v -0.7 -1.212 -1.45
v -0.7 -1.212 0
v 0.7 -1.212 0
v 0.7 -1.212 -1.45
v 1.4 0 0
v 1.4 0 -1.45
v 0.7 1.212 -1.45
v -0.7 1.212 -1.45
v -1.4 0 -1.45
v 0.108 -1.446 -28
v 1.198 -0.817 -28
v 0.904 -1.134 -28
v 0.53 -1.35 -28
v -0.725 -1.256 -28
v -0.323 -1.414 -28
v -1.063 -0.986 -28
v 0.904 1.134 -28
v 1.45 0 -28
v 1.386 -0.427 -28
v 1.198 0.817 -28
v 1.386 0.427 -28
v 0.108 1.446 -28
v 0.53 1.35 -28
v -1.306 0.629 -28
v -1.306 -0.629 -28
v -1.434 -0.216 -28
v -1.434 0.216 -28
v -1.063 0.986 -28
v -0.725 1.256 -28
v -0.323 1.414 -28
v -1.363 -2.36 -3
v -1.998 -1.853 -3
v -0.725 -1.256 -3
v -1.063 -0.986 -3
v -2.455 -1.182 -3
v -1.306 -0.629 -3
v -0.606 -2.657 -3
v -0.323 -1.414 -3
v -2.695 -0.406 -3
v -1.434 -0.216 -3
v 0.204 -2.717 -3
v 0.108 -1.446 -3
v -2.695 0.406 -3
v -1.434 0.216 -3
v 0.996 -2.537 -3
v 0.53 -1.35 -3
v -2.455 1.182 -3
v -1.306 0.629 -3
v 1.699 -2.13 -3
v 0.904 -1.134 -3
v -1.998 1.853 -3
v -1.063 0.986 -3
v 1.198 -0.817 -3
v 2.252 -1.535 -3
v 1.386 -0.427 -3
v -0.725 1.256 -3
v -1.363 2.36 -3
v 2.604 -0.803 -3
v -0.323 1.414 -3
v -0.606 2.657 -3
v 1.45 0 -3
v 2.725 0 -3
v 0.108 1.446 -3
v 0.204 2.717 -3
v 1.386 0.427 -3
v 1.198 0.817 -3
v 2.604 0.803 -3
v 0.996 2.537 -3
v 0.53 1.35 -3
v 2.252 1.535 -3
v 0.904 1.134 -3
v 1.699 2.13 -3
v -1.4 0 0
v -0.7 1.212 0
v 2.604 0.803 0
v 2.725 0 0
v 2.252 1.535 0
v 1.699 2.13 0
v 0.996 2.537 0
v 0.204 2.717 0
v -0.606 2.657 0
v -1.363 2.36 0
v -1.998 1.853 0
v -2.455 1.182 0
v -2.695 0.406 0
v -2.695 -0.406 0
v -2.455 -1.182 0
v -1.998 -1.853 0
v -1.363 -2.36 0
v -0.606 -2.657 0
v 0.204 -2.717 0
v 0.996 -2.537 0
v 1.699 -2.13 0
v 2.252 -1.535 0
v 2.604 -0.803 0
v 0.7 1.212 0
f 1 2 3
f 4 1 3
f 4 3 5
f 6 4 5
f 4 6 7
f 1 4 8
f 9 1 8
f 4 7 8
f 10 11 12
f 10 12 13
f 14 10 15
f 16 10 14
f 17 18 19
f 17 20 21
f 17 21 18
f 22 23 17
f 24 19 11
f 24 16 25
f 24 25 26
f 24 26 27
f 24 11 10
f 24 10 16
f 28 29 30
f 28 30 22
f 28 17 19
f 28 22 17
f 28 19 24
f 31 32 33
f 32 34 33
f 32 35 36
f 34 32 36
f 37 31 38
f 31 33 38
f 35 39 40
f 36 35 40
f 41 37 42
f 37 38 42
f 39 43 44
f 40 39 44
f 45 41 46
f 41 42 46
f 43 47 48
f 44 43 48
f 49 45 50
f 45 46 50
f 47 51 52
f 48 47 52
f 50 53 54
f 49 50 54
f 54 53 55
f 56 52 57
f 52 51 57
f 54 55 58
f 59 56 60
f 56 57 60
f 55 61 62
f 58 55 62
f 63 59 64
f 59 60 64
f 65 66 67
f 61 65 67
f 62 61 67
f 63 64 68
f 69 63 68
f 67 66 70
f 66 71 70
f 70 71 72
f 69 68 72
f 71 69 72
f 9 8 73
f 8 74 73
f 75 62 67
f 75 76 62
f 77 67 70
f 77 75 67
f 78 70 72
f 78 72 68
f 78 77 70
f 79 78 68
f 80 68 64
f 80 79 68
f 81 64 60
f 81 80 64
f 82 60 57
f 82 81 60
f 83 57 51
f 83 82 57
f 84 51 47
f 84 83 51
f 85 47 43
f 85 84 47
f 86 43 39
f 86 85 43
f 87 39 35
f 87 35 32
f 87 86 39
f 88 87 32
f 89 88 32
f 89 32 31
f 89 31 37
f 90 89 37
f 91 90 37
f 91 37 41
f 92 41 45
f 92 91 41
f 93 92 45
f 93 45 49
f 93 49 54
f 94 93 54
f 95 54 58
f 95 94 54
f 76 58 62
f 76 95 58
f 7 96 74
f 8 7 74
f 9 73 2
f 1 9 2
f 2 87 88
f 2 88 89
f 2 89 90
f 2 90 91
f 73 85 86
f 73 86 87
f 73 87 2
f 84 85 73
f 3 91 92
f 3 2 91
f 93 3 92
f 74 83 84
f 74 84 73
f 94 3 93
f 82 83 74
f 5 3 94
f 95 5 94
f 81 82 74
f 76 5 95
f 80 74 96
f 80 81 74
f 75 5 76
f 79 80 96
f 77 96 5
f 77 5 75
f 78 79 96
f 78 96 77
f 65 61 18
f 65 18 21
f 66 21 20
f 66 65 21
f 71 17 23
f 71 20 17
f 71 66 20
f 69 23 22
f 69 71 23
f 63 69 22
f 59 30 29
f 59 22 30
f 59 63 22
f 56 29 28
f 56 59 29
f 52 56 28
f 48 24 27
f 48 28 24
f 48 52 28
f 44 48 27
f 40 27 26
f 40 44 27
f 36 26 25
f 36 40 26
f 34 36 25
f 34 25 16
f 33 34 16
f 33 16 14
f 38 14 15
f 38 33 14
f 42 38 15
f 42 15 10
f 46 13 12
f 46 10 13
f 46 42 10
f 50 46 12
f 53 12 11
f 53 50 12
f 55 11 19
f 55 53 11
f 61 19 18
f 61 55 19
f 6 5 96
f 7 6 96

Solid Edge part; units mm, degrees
sketch "Sketch1" plane through (0, 0, 0) normal (0, 0, 1) x (1, 0, 0)
  circle A0 centre (0, 0) radius 2.725
extrude "Protrusion1" add sketch "Sketch1" against normal blind 3
sketch "Sketch2" plane through (0, 0, 0) normal (0, 0, 1) x (1, 0, 0)
  line L0 (-0.7, -1.2124) -> (-1.05, -0.6062)
  line L1 (-1.4, 0) -> (-1.05, -0.6062)
  line L2 (-1.4, 0) -> (-1.05, 0.6062)
  line L3 (-0.7, 1.2124) -> (-1.05, 0.6062)
  line L4 (-0.7, 1.2124) -> (0, 1.2124)
  line L5 (0.7, 1.2124) -> (0, 1.2124)
  line L6 (0.7, 1.2124) -> (1.05, 0.6062)
  line L7 (1.4, 0) -> (1.05, 0.6062)
  line L8 (1.4, 0) -> (1.05, -0.6062)
  line L9 (0.7, -1.2124) -> (1.05, -0.6062)
  line L10 (0.7, -1.2124) -> (0, -1.2124)
  line L11 (-0.7, -1.2124) -> (0, -1.2124)
extrude "ExtrudedCutout_1" cut sketch "Sketch2" against normal blind 1.45
sketch "Sketch3" plane through (0, 0, -3) normal (0, 0, -1) x (1, 0, 0)
  circle A0 centre (0, 0) radius 1.45
extrude "ExtrudedProtrusion_2" add sketch "Sketch3" along normal blind 25
properties material "Stainless steel"
